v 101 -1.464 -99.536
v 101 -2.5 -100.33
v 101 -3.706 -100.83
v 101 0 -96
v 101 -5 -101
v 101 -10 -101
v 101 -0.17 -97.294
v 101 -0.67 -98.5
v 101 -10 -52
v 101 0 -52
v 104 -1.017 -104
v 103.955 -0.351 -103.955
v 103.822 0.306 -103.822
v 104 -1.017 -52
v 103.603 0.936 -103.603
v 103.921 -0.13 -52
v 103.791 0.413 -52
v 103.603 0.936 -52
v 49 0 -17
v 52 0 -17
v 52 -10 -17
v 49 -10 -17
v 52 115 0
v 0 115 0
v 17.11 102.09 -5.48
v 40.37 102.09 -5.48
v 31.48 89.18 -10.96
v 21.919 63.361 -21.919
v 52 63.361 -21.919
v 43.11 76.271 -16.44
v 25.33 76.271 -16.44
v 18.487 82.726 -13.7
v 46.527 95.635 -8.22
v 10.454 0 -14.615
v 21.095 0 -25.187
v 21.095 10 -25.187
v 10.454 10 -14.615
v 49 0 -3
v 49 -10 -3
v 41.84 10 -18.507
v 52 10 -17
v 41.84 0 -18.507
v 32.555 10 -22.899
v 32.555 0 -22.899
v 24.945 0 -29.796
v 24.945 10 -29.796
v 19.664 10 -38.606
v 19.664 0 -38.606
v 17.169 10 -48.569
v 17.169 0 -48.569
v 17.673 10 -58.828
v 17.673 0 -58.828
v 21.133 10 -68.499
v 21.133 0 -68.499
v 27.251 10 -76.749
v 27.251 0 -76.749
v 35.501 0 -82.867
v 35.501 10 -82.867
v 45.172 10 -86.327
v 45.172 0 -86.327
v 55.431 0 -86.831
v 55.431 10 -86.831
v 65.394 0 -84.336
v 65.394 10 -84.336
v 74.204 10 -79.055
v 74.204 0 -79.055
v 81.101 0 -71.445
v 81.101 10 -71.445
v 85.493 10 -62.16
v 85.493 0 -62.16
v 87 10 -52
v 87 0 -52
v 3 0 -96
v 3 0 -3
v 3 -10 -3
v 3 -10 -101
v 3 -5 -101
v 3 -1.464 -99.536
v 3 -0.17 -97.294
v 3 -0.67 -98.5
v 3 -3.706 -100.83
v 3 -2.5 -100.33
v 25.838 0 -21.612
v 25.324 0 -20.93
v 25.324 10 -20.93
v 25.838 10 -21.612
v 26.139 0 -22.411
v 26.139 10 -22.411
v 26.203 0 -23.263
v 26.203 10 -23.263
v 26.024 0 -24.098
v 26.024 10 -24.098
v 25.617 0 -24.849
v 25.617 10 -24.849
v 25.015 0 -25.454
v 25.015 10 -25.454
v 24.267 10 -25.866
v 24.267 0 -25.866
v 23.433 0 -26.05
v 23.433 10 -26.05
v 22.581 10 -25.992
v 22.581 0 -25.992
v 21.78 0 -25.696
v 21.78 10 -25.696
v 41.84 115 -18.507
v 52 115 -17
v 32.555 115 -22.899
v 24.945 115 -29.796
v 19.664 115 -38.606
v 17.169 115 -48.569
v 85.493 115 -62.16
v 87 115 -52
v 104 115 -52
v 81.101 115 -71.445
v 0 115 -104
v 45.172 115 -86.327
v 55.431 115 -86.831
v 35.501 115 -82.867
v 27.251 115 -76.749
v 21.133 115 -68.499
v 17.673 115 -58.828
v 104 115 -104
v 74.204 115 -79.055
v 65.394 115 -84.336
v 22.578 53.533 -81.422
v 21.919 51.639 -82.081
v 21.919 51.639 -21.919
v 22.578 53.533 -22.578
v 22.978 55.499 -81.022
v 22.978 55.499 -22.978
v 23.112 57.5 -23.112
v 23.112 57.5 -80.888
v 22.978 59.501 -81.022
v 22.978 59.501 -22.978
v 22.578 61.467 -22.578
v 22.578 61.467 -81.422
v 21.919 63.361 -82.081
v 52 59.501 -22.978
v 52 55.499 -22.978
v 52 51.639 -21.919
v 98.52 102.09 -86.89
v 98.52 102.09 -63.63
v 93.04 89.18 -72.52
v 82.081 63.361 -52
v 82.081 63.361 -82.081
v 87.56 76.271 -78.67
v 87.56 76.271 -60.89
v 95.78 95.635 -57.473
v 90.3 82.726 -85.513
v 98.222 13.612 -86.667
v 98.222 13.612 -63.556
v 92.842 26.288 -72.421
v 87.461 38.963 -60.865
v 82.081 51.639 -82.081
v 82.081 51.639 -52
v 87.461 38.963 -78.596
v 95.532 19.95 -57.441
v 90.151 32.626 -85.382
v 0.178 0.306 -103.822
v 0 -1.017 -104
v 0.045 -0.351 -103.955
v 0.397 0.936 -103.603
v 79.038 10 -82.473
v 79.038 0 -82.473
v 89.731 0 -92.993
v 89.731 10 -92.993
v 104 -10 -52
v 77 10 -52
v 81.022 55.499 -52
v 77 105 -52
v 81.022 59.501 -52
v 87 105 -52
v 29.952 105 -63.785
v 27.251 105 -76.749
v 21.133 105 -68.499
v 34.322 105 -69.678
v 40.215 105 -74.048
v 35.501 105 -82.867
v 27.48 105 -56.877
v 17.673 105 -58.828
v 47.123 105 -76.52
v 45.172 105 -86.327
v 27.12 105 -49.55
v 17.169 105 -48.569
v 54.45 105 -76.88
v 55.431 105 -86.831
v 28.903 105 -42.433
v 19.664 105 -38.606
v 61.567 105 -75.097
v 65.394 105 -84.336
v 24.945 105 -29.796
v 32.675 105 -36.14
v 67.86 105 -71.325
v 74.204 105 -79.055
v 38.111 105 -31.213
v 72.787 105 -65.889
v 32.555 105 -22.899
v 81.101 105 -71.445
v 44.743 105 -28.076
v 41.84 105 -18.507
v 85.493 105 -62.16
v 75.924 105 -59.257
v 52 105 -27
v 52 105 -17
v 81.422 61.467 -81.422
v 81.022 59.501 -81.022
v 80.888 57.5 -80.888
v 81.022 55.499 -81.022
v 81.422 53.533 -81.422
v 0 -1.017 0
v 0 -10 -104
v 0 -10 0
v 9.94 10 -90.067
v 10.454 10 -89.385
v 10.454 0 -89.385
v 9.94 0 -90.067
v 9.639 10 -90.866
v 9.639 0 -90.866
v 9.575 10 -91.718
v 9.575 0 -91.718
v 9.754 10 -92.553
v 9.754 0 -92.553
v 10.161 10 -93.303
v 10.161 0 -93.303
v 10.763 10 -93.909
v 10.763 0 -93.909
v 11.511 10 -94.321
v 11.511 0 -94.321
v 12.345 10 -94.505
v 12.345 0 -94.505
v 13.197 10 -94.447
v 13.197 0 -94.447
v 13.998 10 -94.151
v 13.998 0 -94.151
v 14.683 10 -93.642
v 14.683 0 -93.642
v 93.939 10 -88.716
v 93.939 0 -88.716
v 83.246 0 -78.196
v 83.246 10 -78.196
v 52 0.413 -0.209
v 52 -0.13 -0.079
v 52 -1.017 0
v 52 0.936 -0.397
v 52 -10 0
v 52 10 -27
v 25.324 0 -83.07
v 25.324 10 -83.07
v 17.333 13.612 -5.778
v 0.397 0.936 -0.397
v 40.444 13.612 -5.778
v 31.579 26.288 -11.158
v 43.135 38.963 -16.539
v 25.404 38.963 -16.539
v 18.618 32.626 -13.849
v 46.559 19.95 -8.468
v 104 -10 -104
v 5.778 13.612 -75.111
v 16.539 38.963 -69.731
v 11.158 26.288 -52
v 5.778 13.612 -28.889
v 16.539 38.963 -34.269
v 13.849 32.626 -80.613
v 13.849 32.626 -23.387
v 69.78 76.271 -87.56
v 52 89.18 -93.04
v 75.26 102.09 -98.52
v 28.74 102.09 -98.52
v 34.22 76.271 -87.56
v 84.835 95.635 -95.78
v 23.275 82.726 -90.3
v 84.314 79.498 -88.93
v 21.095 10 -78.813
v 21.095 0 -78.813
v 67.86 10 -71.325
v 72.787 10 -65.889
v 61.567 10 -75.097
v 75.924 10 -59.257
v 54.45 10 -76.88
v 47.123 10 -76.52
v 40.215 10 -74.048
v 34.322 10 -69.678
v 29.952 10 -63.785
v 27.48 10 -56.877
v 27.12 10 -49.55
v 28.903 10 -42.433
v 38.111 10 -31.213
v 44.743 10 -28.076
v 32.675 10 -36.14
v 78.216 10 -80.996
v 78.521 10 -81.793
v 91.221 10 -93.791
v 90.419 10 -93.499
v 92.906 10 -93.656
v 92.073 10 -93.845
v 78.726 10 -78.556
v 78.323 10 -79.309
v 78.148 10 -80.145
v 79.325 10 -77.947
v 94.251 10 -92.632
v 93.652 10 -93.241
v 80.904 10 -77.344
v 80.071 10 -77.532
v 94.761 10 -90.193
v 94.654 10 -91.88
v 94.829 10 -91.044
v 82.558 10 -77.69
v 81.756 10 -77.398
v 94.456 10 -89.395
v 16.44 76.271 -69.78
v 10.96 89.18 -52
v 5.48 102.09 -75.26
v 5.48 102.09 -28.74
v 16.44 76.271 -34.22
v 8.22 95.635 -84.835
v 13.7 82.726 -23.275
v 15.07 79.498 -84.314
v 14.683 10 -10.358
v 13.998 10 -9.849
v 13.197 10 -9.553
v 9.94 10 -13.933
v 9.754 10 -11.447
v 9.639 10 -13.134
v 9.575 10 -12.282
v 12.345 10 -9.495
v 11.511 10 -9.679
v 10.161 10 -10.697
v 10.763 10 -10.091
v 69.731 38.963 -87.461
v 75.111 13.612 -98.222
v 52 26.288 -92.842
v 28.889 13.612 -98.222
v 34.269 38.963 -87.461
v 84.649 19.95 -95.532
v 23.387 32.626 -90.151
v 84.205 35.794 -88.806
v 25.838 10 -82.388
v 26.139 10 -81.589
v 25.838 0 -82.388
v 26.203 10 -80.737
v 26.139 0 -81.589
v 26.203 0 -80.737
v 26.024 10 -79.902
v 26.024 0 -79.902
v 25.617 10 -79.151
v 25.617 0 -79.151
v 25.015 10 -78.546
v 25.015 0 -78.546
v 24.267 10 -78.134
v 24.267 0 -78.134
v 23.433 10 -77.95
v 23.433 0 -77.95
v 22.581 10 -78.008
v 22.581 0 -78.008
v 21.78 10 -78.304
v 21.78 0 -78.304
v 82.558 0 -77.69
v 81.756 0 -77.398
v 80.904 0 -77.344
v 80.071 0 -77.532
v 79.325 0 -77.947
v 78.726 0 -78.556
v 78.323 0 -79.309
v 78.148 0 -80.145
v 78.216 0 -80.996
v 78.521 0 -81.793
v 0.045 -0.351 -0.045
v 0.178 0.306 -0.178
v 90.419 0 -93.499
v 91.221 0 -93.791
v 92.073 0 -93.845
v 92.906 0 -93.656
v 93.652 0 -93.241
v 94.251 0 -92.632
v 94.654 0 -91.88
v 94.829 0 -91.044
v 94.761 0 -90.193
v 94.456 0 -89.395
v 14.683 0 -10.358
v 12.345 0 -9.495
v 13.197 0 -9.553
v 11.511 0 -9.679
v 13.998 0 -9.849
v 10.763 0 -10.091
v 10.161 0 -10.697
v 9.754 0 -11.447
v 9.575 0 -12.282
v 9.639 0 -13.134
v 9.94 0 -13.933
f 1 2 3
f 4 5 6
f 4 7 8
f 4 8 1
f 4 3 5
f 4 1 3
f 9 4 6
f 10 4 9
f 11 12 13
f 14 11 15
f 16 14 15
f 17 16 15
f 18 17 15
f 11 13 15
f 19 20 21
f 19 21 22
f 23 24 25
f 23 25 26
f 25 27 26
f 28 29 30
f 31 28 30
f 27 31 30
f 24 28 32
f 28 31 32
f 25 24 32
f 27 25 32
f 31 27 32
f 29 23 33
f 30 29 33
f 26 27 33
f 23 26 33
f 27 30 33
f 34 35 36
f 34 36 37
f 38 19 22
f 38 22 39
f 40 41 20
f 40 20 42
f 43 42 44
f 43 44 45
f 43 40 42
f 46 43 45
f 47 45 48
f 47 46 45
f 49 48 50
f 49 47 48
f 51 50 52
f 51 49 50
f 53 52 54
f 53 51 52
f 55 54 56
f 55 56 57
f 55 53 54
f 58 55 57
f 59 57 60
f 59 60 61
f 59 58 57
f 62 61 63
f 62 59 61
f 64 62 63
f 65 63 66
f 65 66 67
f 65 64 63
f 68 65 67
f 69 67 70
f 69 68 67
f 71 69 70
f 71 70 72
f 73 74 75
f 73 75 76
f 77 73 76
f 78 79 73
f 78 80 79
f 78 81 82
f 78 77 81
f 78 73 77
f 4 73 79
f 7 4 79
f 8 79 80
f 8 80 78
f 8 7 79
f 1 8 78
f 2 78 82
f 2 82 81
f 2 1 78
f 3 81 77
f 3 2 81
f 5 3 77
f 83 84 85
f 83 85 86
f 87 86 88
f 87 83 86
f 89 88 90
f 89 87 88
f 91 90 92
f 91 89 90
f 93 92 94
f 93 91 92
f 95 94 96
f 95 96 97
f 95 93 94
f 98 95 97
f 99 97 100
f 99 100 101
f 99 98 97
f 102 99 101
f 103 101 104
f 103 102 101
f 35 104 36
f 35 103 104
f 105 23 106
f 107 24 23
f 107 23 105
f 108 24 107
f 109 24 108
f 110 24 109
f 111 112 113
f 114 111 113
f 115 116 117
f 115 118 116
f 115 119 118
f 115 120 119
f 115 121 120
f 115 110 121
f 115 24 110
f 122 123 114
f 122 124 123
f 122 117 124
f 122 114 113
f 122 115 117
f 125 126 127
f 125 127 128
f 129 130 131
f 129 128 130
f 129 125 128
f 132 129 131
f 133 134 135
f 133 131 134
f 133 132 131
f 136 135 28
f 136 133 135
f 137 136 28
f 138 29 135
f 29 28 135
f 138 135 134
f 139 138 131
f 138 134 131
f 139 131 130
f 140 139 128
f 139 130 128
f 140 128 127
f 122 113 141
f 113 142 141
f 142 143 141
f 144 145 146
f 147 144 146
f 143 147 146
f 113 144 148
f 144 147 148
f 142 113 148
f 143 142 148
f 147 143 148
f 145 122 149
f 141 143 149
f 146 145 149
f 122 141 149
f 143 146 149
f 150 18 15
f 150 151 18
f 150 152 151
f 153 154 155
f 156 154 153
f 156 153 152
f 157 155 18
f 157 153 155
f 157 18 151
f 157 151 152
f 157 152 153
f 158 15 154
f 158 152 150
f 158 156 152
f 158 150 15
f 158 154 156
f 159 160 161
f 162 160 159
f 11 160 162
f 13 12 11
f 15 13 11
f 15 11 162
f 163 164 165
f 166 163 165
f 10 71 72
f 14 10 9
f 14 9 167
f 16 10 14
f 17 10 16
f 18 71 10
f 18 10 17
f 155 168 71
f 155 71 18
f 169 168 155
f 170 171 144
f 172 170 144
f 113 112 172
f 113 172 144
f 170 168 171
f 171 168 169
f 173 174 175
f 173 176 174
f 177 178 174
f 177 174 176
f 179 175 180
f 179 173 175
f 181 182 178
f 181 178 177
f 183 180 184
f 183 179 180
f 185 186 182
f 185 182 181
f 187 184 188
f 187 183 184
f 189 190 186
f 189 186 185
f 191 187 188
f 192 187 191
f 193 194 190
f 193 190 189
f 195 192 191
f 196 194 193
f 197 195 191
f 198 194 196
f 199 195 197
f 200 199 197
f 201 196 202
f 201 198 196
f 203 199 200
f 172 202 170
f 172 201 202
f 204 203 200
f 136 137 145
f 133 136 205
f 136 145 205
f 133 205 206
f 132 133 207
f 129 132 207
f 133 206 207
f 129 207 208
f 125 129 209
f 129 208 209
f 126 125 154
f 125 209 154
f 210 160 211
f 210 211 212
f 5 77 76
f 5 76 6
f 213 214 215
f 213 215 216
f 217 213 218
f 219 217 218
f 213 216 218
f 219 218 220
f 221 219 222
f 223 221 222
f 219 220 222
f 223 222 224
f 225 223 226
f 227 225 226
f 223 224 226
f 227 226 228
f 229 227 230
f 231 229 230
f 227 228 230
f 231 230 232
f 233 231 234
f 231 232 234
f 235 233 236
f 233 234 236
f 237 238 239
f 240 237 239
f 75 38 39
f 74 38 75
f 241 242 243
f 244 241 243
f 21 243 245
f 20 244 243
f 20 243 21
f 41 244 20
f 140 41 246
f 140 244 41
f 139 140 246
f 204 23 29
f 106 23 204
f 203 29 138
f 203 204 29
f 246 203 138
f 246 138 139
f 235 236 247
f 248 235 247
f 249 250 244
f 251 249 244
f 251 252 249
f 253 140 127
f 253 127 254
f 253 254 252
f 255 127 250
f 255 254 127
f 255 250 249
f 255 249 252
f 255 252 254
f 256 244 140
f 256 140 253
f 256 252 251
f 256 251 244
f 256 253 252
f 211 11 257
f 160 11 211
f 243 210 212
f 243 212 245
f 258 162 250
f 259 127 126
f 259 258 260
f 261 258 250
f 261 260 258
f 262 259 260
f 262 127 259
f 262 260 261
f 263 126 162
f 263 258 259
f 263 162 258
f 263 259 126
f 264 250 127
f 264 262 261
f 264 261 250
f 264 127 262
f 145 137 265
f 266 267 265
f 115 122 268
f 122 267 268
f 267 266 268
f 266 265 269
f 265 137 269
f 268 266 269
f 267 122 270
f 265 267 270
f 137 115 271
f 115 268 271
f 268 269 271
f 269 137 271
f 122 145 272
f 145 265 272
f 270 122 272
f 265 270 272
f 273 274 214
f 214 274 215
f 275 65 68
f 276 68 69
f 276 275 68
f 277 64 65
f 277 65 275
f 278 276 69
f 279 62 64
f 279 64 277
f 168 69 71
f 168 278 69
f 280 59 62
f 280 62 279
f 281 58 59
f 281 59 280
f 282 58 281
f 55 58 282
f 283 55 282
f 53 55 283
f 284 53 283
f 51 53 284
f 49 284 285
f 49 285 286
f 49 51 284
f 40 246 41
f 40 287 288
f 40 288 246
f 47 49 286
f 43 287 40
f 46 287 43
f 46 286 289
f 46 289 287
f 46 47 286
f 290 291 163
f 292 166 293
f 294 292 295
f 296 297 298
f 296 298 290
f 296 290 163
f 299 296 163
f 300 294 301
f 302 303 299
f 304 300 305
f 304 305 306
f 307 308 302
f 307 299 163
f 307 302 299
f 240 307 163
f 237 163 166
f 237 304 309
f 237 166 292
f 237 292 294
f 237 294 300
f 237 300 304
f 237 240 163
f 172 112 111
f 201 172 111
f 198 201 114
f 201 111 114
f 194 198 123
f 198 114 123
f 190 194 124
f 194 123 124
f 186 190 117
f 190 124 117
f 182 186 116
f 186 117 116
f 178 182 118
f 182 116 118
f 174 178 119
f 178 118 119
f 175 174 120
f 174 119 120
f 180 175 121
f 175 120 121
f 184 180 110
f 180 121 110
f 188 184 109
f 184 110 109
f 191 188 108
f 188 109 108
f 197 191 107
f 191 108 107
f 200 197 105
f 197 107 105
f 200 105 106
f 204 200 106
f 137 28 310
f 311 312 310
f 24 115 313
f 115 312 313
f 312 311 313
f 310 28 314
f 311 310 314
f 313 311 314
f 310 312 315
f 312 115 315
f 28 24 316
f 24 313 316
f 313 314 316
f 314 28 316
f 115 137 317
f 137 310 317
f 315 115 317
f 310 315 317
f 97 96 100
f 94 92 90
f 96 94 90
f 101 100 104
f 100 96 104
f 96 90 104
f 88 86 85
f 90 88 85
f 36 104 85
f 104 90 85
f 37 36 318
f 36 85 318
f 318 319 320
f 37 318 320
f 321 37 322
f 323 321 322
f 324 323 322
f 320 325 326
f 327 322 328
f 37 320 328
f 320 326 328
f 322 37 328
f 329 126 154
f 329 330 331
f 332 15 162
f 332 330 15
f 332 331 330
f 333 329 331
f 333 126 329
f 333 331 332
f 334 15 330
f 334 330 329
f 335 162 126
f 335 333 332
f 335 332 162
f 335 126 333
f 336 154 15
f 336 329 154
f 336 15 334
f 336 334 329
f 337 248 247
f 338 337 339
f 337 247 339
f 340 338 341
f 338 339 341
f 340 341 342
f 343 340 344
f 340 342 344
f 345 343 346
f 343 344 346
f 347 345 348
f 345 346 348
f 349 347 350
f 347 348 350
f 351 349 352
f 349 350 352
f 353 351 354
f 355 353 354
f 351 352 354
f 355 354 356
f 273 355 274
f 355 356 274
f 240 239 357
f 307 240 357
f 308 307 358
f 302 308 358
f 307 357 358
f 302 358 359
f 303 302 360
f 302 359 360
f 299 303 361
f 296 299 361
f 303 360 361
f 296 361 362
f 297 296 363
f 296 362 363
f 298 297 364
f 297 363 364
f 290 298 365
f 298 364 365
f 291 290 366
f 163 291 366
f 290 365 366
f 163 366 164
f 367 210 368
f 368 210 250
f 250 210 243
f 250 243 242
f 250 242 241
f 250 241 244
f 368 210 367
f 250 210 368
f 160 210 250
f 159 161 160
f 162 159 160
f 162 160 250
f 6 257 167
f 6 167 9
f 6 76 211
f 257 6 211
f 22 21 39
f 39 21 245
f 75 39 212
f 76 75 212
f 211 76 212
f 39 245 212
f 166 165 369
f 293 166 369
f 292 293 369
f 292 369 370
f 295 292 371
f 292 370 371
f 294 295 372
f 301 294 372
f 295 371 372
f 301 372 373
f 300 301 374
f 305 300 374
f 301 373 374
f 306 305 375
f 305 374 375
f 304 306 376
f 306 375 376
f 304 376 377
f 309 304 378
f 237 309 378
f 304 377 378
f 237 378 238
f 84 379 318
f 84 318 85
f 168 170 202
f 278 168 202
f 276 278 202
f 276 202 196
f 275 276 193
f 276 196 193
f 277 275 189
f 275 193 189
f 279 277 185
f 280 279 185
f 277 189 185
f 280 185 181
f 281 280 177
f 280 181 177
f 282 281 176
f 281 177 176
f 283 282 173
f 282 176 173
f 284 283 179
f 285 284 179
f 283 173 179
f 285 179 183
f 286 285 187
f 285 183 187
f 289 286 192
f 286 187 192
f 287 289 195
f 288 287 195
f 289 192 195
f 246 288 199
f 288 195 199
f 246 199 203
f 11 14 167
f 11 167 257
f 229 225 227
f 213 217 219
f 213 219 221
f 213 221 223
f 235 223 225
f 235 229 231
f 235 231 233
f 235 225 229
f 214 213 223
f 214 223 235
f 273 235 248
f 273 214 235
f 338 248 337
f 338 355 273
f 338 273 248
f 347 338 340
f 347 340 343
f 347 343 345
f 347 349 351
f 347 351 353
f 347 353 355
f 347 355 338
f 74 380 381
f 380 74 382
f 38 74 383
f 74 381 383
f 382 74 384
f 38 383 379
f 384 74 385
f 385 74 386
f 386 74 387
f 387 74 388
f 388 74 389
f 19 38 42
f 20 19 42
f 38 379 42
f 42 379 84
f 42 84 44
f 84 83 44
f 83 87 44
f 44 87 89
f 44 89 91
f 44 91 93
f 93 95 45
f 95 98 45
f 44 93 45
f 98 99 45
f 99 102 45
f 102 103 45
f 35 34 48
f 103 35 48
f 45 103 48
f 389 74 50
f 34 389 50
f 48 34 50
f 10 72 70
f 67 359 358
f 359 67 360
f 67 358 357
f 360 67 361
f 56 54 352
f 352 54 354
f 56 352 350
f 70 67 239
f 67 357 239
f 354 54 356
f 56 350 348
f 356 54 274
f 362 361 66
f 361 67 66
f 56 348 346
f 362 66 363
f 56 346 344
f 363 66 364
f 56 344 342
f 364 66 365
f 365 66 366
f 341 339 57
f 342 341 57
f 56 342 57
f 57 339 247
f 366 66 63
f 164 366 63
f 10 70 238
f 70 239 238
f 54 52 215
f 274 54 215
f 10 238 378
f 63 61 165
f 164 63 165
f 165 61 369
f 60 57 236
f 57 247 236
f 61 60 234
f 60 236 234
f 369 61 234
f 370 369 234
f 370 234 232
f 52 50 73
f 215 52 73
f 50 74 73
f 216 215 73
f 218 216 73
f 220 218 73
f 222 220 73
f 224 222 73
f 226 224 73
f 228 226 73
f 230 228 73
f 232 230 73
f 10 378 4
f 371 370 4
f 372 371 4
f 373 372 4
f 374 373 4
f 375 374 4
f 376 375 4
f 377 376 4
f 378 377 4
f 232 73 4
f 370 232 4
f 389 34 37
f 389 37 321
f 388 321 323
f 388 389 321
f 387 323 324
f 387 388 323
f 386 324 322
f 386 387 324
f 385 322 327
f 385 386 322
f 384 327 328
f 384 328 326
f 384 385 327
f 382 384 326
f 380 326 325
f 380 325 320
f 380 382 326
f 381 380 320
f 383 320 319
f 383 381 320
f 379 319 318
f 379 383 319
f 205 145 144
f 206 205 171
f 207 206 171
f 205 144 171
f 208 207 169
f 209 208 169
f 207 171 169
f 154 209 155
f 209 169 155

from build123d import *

# Parameters (mm, degrees)
SKETCH1_W           = 104
SKETCH1_H           = 104
BOSS_EXTRUDE1_DEPTH = 57.5
BOSS_EXTRUDE1_TAPER = 23
SKETCH2_R           = 25
CUT_EXTRUDE1_DEPTH  = 187.700294763
FILLET1_R           = 15
SKETCH3_R           = 35
CUT_EXTRUDE2_DEPTH  = 10
CUT_EXTRUDE3_START  = -10
SKETCH4_R           = 35
CUT_EXTRUDE3_DEPTH  = 10
SKETCH5_W           = 52
SKETCH5_H           = 52
CUT_EXTRUDE4_DEPTH  = 187.700294763
BOSS_EXTRUDE2_DEPTH = 10
FILLET2_R           = 5
FILLET3_R           = 5
CUT_EXTRUDE5_DEPTH  = 10


with BuildPart() as part:
    # Sketch1 → Boss-Extrude1 (new body)
    with BuildSketch(Plane(origin=(0, 0, 0), x_dir=(1, 0, 0), z_dir=(0, 1, 0))):
        with Locations((52, 52)):
            Rectangle(SKETCH1_W, SKETCH1_H)
    extrude(amount=BOSS_EXTRUDE1_DEPTH, taper=BOSS_EXTRUDE1_TAPER)

    # Mirror1: part across plane


with BuildPart() as part_1:
    add(part.part)
    add(part.part.mirror(Plane(origin=(0, 57.5, 0), x_dir=(0, 0, 1), z_dir=(0, -1, 0))))

    # Sketch2 → Cut-Extrude1 (cut, through all)
    with BuildSketch(Plane(origin=(0, 115, 0), x_dir=(1, 0, 0), z_dir=(0, 1, 0))):
        with Locations(Location((52, 52, 0), (0, 0, 270))):
            Circle(SKETCH2_R)
    extrude(amount=-CUT_EXTRUDE1_DEPTH, mode=Mode.SUBTRACT)

    # Fillet1
    # the kernel refuses this fillet: 15 mm, written as the material it adds along each edge
    with BuildSketch(Plane(origin=(24.407301932, 57.5, -95.510503676), x_dir=(-0.39073112848927455, -0.9205048534524399, 0), z_dir=(0, 0, 1))) as fillet1_piece_1_section:
        with BuildLine():
            CenterArc((FILLET1_R * 0.42447481621, -FILLET1_R), FILLET1_R, 90, 46)
            Line((-FILLET1_R * 0.294864984129, -FILLET1_R * 0.305341629541), (0, 0))
            Line((0, 0), (FILLET1_R * 0.42447481621, 0))
        make_face()
    fillet1_piece_1 = extrude(amount=87.021007352, mode=Mode.PRIVATE)
    fillet1_piece_1 = fillet1_piece_1 - Plane(origin=(24.407301932, 57.5, -8.111896271), x_dir=(0, -0.39073112848927466, -0.9205048534524399), z_dir=(-1, 0, 0)) * Cylinder(15, 200, mode=Mode.PRIVATE)
    fillet1_piece_1 = fillet1_piece_1 - Plane(origin=(24.407301932, 57.5, -95.888103729), x_dir=(0, -0.3907311284892748, 0.9205048534524398), z_dir=(1, 0, 0)) * Cylinder(15, 200, mode=Mode.PRIVATE)
    add(fillet1_piece_1)
    with BuildSketch(Plane(origin=(8.489496324, 57.5, -24.407301932), x_dir=(0, -0.9205048534524399, 0.39073112848927455), z_dir=(1, 0, 0))) as fillet1_piece_2_section:
        with BuildLine():
            CenterArc((FILLET1_R * 0.42447481621, -FILLET1_R), FILLET1_R, 90, 46)
            Line((-FILLET1_R * 0.294864984129, -FILLET1_R * 0.305341629541), (0, 0))
            Line((0, 0), (FILLET1_R * 0.42447481621, 0))
        make_face()
    fillet1_piece_2 = extrude(amount=87.021007352, mode=Mode.PRIVATE)
    fillet1_piece_2 = fillet1_piece_2 - Plane(origin=(95.888103729, 57.5, -24.407301932), x_dir=(-0.9205048534524398, -0.3907311284892748, 0), z_dir=(0, 0, 1)) * Cylinder(15, 200, mode=Mode.PRIVATE)
    fillet1_piece_2 = fillet1_piece_2 - Plane(origin=(8.111896271, 57.5, -24.407301932), x_dir=(0.9205048534524399, -0.39073112848927466, 0), z_dir=(0, 0, -1)) * Cylinder(15, 200, mode=Mode.PRIVATE)
    add(fillet1_piece_2)
    with BuildSketch(Plane(origin=(79.592698068, 57.5, -8.489496324), x_dir=(0.39073112848927455, -0.9205048534524399, 0), z_dir=(0, 0, -1))) as fillet1_piece_3_section:
        with BuildLine():
            CenterArc((FILLET1_R * 0.42447481621, -FILLET1_R), FILLET1_R, 90, 46)
            Line((-FILLET1_R * 0.294864984129, -FILLET1_R * 0.305341629541), (0, 0))
            Line((0, 0), (FILLET1_R * 0.42447481621, 0))
        make_face()
    fillet1_piece_3 = extrude(amount=87.021007352, mode=Mode.PRIVATE)
    fillet1_piece_3 = fillet1_piece_3 - Plane(origin=(79.592698068, 57.5, -8.111896271), x_dir=(0, -0.39073112848927466, -0.9205048534524399), z_dir=(-1, 0, 0)) * Cylinder(15, 200, mode=Mode.PRIVATE)
    fillet1_piece_3 = fillet1_piece_3 - Plane(origin=(79.592698068, 57.5, -95.888103729), x_dir=(0, -0.3907311284892748, 0.9205048534524398), z_dir=(1, 0, 0)) * Cylinder(15, 200, mode=Mode.PRIVATE)
    add(fillet1_piece_3)
    with BuildSketch(Plane(origin=(95.510503676, 57.5, -79.592698068), x_dir=(0, -0.9205048534524399, -0.39073112848927455), z_dir=(-1, 0, 0))) as fillet1_piece_4_section:
        with BuildLine():
            CenterArc((FILLET1_R * 0.42447481621, -FILLET1_R), FILLET1_R, 90, 46)
            Line((-FILLET1_R * 0.294864984129, -FILLET1_R * 0.305341629541), (0, 0))
            Line((0, 0), (FILLET1_R * 0.42447481621, 0))
        make_face()
    fillet1_piece_4 = extrude(amount=87.021007352, mode=Mode.PRIVATE)
    fillet1_piece_4 = fillet1_piece_4 - Plane(origin=(95.888103729, 57.5, -79.592698068), x_dir=(-0.9205048534524398, -0.3907311284892748, 0), z_dir=(0, 0, 1)) * Cylinder(15, 200, mode=Mode.PRIVATE)
    fillet1_piece_4 = fillet1_piece_4 - Plane(origin=(8.111896271, 57.5, -79.592698068), x_dir=(0.9205048534524399, -0.39073112848927466, 0), z_dir=(0, 0, -1)) * Cylinder(15, 200, mode=Mode.PRIVATE)
    add(fillet1_piece_4)

    # Sketch3 → Cut-Extrude2 (cut)
    with BuildSketch(Plane(origin=(0, 115, 0), x_dir=(1, 0, 0), z_dir=(0, 1, 0))):
        with Locations(Location((52, 52, 0), (0, 0, 270))):
            Circle(SKETCH3_R)
    extrude(amount=-CUT_EXTRUDE2_DEPTH, mode=Mode.SUBTRACT)

    # Sketch4 → Cut-Extrude3 (cut)
    with BuildSketch(Plane.XZ.offset(CUT_EXTRUDE3_START)):
        with Locations(Location((52, -52, 0), (0, 0, 90))):
            Circle(SKETCH4_R)
    extrude(amount=CUT_EXTRUDE3_DEPTH, mode=Mode.SUBTRACT)

    # Sketch5 → Cut-Extrude4 (cut, through all)
    with BuildSketch(Plane(origin=(0, 115, 0), x_dir=(1, 0, 0), z_dir=(0, 1, 0))):
        with Locations((78, 26)):
            Rectangle(SKETCH5_W, SKETCH5_H)
    extrude(amount=-CUT_EXTRUDE4_DEPTH, mode=Mode.SUBTRACT)

    # Sketch7 → Boss-Extrude2 (add)
    with BuildSketch(Plane.XZ):
        Polygon((49, -17), (49, -3), (3, -3), (3, -101), (101, -101), (101, -52), (104, -52), (104, -104), (0, -104), (0, 0), (52, 0), (52, -17), align=None)
    extrude(amount=BOSS_EXTRUDE2_DEPTH)

    # Fillet2
    fillet2_edges = [part_1.edges().sort_by_distance(p)[0] for p in [
        (52, 0, -101),
        (26, 0, 0),
        (0, 0, -52),
        (104, 0, -78),
    ]]
    fillet(fillet2_edges, radius=FILLET2_R)

    # Fillet3
    fillet3_edges = [part_1.edges().sort_by_distance(p)[0] for p in [
        (52, 0, -104),
    ]]
    fillet(fillet3_edges, radius=FILLET3_R)

    # Sketch8 → Cut-Extrude5 (cut)
    with BuildSketch(Plane.XZ):
        with BuildLine():
            Line((14.682837651, -10.358480419), (25.323985369, -20.930423251))
            ThreePointArc((25.323985369, -20.930423251), (25.337826346, -25.173041361), (21.095208236, -25.186882338))
            Line((21.095208236, -25.186882338), (10.454060518, -14.614939506))
            ThreePointArc((10.454060518, -14.614939506), (10.440219541, -10.372321396), (14.682837651, -10.358480419))
        make_face()
        with BuildLine():
            Line((14.682837651, -93.641519581), (25.323985369, -83.069576749))
            ThreePointArc((25.323985369, -83.069576749), (25.337826346, -78.826958639), (21.095208236, -78.813117662))
            Line((21.095208236, -78.813117662), (10.454060518, -89.385060494))
            ThreePointArc((10.454060518, -89.385060494), (10.440219541, -93.627678604), (14.682837651, -93.641519581))
        make_face()
        with BuildLine():
            Line((93.938828765, -88.715537796), (83.246195736, -78.19567093))
            ThreePointArc((83.246195736, -78.19567093), (79.003695757, -78.230224162), (79.038248989, -82.472724142))
            Line((79.038248989, -82.472724142), (89.730882019, -92.992591008))
            ThreePointArc((89.730882019, -92.992591008), (93.973381998, -92.958037776), (93.938828765, -88.715537796))
        make_face()
    extrude(amount=-CUT_EXTRUDE5_DEPTH, mode=Mode.SUBTRACT)


solid = part_1.part
